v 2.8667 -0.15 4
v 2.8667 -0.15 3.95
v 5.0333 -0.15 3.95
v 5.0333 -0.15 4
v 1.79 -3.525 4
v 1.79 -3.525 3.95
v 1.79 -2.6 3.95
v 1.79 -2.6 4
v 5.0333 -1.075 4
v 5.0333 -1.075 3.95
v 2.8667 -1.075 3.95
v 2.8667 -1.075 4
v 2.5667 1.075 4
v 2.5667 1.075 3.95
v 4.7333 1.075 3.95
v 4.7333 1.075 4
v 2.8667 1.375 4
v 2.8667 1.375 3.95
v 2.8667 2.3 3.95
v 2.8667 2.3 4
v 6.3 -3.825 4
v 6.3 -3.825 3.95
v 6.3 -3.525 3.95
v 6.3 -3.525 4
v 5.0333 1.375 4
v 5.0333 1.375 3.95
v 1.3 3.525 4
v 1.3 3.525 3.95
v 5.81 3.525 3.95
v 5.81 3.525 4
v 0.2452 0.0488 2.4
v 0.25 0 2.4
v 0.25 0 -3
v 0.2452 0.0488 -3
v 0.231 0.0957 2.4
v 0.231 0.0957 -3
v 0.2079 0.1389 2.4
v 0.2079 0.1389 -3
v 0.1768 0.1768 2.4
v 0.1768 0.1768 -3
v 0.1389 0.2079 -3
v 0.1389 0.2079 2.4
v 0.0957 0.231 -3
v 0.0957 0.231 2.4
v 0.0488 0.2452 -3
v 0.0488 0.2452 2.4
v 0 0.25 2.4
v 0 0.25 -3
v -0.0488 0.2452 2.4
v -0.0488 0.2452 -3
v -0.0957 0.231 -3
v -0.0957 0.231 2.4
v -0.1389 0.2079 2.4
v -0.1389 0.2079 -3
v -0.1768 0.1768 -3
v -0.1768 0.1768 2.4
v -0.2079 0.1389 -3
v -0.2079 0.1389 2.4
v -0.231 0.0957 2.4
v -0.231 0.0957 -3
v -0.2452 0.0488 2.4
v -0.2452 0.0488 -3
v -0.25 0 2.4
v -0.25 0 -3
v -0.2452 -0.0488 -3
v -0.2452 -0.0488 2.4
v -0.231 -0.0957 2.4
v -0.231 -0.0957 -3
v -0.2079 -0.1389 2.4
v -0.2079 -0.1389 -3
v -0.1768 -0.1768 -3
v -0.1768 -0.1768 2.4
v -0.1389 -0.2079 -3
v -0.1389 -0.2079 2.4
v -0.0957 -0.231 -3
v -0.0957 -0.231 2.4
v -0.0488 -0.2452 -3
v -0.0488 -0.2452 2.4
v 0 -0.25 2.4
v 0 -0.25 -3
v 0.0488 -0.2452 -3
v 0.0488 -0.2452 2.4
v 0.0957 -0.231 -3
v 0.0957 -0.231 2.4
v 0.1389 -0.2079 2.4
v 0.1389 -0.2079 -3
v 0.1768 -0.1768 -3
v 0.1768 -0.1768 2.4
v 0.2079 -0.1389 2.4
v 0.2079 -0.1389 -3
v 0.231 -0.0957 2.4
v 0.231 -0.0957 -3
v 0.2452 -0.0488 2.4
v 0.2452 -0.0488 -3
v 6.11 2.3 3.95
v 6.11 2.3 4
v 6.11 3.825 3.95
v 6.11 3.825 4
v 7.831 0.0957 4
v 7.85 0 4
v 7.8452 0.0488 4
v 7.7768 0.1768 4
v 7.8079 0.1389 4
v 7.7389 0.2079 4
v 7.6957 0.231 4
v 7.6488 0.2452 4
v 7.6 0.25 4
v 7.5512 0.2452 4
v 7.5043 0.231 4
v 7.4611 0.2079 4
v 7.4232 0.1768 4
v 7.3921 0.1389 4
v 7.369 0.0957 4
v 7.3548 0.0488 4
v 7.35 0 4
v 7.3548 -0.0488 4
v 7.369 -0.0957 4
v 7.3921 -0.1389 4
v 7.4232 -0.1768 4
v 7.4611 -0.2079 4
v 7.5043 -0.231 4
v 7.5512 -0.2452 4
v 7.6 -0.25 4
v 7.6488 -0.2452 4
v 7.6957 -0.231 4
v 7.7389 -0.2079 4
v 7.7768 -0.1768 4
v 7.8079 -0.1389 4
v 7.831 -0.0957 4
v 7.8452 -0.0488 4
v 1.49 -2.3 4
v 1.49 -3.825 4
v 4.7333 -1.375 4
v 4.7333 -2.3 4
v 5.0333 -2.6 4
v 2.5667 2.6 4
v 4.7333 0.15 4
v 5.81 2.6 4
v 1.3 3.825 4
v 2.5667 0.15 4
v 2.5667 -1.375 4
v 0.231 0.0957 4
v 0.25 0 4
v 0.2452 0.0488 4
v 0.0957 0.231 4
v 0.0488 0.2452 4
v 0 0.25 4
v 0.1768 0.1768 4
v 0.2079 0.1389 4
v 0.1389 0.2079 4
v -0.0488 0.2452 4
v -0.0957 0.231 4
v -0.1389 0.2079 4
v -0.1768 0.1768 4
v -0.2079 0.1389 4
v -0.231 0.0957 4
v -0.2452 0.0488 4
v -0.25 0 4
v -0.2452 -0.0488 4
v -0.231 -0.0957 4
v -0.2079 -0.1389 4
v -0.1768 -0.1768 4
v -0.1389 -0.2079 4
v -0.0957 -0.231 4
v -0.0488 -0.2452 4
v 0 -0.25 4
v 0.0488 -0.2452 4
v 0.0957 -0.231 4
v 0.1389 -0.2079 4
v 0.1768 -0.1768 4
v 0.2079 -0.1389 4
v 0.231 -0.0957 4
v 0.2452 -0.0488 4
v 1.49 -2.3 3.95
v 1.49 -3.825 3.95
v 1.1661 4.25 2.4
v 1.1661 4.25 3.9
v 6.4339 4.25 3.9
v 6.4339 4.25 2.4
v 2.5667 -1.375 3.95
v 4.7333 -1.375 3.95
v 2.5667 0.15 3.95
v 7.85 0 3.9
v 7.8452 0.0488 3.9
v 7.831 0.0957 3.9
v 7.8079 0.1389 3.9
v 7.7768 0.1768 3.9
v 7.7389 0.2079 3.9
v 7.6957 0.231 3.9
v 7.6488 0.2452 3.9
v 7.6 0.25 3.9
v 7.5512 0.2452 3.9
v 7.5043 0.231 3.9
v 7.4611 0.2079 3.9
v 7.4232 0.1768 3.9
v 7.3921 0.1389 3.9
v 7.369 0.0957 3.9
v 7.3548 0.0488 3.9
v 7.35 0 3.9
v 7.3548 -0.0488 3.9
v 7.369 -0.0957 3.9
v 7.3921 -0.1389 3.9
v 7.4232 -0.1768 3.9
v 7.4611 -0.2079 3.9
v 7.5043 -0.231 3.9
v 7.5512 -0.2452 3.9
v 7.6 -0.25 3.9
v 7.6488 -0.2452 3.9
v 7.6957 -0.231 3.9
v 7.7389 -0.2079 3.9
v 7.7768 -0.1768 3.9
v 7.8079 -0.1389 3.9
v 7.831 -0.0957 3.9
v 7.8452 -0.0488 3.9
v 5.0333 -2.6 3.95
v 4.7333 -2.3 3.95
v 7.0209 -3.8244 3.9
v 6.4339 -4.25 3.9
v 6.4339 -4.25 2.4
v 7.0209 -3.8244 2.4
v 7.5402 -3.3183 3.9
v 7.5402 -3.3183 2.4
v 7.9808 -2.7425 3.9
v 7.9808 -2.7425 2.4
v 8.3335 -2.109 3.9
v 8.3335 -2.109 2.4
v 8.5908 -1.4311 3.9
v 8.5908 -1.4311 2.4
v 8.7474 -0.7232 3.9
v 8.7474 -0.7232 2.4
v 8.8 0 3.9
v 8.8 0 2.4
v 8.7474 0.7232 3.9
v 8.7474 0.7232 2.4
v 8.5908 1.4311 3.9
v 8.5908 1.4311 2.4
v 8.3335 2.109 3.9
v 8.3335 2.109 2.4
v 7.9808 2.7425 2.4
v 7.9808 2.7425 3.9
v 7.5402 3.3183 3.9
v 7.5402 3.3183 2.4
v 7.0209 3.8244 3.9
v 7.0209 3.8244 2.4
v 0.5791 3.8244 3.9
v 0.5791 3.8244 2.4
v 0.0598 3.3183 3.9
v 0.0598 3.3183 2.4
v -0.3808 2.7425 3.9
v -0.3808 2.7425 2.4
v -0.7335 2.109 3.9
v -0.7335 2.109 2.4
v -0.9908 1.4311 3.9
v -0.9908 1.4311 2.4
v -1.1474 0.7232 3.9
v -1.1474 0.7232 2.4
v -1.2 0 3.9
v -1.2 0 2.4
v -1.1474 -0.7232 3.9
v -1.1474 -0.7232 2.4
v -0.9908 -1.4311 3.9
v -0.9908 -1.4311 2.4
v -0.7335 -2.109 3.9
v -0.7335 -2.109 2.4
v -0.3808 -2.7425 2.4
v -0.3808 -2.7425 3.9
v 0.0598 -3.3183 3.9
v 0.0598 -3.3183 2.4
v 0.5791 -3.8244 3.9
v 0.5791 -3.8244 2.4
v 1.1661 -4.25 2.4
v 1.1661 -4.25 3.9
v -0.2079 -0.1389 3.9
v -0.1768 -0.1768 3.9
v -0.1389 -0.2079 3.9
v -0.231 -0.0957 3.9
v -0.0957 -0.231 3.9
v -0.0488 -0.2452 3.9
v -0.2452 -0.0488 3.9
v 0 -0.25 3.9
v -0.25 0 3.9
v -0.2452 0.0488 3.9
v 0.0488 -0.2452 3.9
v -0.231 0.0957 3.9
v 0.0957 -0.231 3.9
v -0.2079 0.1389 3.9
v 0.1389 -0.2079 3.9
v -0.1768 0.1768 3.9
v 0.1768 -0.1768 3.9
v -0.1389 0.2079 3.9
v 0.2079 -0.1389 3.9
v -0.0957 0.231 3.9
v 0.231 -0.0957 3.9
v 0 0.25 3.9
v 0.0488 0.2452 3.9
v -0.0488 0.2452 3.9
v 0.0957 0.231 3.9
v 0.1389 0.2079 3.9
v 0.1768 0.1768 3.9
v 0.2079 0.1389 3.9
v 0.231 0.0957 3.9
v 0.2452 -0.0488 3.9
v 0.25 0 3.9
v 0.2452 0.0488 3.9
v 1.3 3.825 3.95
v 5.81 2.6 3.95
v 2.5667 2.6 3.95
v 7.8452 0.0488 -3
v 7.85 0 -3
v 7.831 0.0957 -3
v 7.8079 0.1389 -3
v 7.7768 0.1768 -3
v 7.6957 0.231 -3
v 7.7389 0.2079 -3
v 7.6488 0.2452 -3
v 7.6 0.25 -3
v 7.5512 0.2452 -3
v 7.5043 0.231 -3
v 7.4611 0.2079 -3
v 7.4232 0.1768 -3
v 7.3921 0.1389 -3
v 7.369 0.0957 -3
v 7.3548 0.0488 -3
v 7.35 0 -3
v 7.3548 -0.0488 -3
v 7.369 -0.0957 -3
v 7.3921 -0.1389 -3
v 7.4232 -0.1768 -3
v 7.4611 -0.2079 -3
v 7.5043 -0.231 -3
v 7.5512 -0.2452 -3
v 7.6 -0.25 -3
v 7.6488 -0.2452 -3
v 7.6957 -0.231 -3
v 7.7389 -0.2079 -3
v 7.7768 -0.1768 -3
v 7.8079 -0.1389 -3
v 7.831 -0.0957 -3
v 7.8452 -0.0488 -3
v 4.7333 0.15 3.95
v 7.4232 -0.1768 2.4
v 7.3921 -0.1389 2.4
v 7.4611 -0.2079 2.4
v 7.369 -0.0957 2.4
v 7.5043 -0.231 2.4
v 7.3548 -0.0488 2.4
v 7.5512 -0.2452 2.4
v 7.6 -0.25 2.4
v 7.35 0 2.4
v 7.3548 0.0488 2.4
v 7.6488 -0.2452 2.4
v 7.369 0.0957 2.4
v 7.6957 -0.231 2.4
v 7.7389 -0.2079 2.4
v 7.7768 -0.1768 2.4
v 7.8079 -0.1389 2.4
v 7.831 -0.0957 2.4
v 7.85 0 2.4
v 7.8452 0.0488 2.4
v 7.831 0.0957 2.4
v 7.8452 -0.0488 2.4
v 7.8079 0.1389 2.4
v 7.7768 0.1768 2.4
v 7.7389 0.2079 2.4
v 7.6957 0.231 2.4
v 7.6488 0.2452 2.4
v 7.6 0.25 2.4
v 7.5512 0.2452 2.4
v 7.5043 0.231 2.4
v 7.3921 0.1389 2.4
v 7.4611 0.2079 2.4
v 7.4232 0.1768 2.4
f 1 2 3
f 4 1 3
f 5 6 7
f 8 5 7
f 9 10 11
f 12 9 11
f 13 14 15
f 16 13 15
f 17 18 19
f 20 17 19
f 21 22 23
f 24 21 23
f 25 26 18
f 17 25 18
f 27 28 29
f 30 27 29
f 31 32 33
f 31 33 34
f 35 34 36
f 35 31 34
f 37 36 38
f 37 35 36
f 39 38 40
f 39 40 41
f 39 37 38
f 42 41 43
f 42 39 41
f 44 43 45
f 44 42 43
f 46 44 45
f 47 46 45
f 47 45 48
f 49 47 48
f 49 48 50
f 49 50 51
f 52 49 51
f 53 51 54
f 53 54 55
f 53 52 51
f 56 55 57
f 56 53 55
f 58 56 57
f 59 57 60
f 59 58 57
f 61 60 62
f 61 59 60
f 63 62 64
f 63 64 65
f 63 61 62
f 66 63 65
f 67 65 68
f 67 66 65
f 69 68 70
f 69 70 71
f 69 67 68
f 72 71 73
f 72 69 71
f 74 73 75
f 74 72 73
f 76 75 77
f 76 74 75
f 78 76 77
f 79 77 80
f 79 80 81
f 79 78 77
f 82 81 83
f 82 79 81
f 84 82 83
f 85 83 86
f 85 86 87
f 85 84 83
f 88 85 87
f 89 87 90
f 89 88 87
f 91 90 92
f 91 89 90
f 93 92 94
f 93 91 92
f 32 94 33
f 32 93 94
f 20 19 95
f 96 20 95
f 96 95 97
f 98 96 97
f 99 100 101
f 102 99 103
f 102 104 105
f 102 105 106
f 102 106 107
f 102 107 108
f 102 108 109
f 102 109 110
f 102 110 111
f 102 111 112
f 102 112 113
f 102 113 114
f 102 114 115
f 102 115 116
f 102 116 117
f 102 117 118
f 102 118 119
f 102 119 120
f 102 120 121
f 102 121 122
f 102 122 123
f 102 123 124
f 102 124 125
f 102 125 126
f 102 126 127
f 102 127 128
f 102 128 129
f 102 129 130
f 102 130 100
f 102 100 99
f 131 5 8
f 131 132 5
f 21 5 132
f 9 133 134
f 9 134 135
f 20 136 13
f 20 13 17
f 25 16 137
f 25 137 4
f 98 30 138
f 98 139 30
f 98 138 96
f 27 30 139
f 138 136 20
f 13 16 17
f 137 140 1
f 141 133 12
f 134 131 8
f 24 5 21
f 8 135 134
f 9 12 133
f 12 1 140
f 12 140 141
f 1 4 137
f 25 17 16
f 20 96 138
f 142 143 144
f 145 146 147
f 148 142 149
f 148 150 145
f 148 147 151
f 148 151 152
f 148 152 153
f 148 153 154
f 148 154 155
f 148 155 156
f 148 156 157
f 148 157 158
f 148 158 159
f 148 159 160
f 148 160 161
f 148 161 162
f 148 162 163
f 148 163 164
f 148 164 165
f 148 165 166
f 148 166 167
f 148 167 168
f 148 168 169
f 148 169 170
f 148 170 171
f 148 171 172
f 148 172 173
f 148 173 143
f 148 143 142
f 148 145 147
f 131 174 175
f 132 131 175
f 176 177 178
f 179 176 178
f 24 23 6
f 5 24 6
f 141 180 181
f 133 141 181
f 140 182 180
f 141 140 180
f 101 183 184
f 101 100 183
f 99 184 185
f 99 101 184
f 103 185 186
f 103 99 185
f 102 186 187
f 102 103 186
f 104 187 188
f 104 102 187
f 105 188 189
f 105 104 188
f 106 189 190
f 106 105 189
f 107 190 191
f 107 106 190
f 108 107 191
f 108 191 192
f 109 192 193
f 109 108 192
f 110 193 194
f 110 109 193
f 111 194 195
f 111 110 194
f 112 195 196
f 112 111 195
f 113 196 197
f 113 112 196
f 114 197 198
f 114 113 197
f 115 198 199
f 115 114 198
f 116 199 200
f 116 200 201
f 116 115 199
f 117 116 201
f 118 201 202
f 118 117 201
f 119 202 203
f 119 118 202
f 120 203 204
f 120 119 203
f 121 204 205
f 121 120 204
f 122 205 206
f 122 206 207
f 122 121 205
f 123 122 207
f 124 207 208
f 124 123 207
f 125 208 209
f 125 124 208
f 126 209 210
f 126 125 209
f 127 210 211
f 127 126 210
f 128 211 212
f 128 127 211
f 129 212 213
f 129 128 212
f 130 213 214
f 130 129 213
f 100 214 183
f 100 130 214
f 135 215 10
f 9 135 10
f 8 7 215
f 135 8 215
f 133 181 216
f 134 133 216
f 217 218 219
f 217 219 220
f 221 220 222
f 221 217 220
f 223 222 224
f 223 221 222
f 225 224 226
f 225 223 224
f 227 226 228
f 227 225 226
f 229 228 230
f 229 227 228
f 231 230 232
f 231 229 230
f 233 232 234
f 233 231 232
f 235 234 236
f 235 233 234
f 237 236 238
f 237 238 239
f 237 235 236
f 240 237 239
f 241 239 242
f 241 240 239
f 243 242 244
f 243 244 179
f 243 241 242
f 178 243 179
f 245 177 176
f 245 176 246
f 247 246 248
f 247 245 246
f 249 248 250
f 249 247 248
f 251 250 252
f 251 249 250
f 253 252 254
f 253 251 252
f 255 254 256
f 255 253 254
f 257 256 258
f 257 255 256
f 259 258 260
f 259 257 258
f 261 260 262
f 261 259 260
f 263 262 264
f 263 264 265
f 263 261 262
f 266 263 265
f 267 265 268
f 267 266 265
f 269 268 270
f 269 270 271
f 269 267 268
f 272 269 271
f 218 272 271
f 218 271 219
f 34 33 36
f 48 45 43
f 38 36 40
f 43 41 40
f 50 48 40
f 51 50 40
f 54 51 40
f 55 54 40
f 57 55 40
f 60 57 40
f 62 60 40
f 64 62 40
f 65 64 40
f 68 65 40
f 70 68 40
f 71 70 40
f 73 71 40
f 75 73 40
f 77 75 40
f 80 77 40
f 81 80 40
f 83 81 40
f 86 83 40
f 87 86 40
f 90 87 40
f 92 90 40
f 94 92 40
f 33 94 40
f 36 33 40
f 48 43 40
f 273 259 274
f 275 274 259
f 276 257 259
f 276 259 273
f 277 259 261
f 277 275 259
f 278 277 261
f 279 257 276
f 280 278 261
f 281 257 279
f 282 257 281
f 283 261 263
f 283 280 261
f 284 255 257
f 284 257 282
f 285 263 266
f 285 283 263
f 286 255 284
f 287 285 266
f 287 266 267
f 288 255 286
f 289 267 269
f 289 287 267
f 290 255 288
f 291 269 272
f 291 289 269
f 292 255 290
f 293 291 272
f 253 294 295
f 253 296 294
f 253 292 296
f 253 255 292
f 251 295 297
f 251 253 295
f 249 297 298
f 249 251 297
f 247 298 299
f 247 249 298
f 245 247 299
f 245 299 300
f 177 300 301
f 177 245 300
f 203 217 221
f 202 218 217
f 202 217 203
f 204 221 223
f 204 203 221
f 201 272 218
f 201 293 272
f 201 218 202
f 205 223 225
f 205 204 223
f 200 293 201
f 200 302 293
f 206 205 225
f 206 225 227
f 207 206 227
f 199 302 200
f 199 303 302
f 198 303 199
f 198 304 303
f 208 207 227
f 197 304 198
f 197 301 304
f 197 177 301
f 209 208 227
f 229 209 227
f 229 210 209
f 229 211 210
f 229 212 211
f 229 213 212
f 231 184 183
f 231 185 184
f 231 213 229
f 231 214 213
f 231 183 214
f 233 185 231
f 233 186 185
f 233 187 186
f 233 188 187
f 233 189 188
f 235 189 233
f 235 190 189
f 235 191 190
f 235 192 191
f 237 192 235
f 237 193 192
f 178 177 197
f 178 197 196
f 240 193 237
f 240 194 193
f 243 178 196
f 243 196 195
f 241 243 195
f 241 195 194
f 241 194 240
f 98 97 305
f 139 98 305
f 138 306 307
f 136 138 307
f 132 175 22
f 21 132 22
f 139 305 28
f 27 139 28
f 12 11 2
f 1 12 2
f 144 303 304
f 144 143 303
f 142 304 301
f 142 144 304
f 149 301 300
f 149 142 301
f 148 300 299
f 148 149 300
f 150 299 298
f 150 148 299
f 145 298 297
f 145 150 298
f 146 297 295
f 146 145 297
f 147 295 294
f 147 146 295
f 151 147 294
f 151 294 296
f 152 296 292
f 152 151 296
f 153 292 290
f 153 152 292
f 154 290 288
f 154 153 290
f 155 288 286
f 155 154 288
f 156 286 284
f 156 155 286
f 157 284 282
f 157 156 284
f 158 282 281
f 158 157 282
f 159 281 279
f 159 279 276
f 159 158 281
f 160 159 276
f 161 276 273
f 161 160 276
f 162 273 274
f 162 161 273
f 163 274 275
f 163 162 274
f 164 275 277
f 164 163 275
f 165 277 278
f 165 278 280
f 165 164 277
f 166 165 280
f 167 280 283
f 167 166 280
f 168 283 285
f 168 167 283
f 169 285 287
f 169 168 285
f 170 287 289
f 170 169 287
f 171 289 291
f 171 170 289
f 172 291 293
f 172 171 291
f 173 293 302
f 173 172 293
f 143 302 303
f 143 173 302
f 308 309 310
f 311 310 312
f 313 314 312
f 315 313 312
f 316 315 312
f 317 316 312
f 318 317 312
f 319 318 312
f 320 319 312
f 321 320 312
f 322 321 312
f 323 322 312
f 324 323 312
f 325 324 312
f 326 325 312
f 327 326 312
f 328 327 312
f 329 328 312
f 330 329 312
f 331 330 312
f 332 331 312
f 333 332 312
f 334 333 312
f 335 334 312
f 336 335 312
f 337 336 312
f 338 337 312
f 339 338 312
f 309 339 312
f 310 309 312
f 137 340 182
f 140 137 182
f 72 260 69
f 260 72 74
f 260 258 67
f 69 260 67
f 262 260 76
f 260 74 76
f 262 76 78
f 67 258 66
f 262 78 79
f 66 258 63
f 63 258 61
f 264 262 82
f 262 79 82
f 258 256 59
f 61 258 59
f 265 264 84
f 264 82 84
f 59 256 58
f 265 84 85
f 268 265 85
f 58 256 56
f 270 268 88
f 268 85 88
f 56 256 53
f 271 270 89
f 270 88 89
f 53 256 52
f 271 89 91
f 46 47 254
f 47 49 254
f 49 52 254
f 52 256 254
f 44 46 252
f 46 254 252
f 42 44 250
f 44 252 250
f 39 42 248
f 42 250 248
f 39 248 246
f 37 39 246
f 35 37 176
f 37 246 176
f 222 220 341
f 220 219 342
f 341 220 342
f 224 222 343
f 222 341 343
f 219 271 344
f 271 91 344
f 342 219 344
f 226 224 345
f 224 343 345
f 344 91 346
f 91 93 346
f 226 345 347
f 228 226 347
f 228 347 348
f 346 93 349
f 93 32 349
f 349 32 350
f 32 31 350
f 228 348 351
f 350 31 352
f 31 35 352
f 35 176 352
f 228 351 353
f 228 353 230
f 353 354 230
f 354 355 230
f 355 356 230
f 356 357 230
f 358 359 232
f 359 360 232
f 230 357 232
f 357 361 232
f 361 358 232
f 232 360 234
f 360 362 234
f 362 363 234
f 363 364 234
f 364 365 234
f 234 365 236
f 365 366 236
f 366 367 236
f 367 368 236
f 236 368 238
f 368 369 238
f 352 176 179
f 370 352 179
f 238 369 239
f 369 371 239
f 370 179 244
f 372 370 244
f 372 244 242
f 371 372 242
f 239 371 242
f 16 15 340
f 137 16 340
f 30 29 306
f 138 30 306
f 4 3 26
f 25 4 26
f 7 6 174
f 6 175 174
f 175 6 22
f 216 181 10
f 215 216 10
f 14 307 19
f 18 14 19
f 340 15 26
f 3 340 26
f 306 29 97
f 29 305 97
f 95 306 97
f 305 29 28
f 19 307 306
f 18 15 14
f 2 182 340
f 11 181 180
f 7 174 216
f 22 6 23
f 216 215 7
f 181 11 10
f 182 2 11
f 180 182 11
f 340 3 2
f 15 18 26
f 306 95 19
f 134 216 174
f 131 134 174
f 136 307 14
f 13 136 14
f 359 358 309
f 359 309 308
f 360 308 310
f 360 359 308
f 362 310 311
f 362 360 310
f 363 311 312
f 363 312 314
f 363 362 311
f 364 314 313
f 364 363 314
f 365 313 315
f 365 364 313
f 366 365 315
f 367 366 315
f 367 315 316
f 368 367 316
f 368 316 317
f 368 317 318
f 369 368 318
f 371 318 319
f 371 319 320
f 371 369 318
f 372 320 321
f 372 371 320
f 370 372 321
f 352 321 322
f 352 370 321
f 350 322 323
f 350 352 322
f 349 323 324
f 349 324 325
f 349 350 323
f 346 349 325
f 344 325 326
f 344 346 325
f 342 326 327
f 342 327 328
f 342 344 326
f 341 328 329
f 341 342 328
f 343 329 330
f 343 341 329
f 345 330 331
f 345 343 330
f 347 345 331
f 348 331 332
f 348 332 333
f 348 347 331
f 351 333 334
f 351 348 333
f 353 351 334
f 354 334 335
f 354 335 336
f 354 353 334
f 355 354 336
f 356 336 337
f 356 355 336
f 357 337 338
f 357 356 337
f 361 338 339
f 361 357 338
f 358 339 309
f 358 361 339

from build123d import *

# Parameters (mm, degrees)
PAD001_DEPTH   = 1.5
SKETCH_R       = 0.25
PAD_DEPTH      = 4
PAD_DEPTH_BACK = 3
PAD002_DEPTH   = 0.05


with BuildPart() as pad001:
    # Sketch001 → Pad001 (new body)
    with BuildSketch(Plane.XY.offset(3.9)):
        with BuildLine():
            ThreePointArc((1.166087, 4.25), (-1.2, 0), (1.166087, -4.25))
            Line((1.166087, -4.25), (6.433913, -4.25))
            ThreePointArc((6.433913, -4.25), (8.8, 0), (6.433913, 4.25))
            Line((1.166087, 4.25), (6.433913, 4.25))
        make_face()
    extrude(amount=-PAD001_DEPTH)


with BuildPart() as pad:
    # Sketch → Pad (new body, two sides)
    with BuildSketch(Plane.XY) as pad_sk:
        Circle(SKETCH_R)
        with Locations((7.6, 0)):
            Circle(SKETCH_R)
    extrude(amount=PAD_DEPTH)
    extrude(pad_sk.sketch, amount=-PAD_DEPTH_BACK)


with BuildPart() as r_ldr_10x8_5mm_p7_6mm_vertical:
    # Sketch002 → Pad002 (new body)
    with BuildSketch(Plane.XY.offset(3.95)):
        Polygon((1.3, 3.525), (5.81, 3.525), (5.81, 2.6), (2.566667, 2.6), (2.566667, 2.3), (2.566667, 1.075), (2.866667, 1.075), (4.733333, 1.075), (4.733333, 0.15), (2.566667, 0.15), (2.566667, -0.15), (2.566667, -1.375), (2.866667, -1.375), (4.733333, -1.375), (4.733333, -2.3), (1.49, -2.3), (1.49, -2.6), (1.49, -3.825), (1.79, -3.825), (6.3, -3.825), (6.3, -3.525), (1.79, -3.525), (1.79, -2.6), (4.733333, -2.6), (5.033333, -2.6), (5.033333, -1.375), (5.033333, -1.075), (2.866667, -1.075), (2.866667, -0.15), (4.733333, -0.15), (5.033333, -0.15), (5.033333, 1.075), (5.033333, 1.375), (2.866667, 1.375), (2.866667, 2.3), (5.81, 2.3), (6.11, 2.3), (6.11, 3.525), (6.11, 3.825), (1.3, 3.825), align=None)
    extrude(amount=PAD002_DEPTH)

    # Pad002_mp_cp: union Pad001, Pad
    add(pad001.part)
    add(pad.part)


solid = r_ldr_10x8_5mm_p7_6mm_vertical.part
